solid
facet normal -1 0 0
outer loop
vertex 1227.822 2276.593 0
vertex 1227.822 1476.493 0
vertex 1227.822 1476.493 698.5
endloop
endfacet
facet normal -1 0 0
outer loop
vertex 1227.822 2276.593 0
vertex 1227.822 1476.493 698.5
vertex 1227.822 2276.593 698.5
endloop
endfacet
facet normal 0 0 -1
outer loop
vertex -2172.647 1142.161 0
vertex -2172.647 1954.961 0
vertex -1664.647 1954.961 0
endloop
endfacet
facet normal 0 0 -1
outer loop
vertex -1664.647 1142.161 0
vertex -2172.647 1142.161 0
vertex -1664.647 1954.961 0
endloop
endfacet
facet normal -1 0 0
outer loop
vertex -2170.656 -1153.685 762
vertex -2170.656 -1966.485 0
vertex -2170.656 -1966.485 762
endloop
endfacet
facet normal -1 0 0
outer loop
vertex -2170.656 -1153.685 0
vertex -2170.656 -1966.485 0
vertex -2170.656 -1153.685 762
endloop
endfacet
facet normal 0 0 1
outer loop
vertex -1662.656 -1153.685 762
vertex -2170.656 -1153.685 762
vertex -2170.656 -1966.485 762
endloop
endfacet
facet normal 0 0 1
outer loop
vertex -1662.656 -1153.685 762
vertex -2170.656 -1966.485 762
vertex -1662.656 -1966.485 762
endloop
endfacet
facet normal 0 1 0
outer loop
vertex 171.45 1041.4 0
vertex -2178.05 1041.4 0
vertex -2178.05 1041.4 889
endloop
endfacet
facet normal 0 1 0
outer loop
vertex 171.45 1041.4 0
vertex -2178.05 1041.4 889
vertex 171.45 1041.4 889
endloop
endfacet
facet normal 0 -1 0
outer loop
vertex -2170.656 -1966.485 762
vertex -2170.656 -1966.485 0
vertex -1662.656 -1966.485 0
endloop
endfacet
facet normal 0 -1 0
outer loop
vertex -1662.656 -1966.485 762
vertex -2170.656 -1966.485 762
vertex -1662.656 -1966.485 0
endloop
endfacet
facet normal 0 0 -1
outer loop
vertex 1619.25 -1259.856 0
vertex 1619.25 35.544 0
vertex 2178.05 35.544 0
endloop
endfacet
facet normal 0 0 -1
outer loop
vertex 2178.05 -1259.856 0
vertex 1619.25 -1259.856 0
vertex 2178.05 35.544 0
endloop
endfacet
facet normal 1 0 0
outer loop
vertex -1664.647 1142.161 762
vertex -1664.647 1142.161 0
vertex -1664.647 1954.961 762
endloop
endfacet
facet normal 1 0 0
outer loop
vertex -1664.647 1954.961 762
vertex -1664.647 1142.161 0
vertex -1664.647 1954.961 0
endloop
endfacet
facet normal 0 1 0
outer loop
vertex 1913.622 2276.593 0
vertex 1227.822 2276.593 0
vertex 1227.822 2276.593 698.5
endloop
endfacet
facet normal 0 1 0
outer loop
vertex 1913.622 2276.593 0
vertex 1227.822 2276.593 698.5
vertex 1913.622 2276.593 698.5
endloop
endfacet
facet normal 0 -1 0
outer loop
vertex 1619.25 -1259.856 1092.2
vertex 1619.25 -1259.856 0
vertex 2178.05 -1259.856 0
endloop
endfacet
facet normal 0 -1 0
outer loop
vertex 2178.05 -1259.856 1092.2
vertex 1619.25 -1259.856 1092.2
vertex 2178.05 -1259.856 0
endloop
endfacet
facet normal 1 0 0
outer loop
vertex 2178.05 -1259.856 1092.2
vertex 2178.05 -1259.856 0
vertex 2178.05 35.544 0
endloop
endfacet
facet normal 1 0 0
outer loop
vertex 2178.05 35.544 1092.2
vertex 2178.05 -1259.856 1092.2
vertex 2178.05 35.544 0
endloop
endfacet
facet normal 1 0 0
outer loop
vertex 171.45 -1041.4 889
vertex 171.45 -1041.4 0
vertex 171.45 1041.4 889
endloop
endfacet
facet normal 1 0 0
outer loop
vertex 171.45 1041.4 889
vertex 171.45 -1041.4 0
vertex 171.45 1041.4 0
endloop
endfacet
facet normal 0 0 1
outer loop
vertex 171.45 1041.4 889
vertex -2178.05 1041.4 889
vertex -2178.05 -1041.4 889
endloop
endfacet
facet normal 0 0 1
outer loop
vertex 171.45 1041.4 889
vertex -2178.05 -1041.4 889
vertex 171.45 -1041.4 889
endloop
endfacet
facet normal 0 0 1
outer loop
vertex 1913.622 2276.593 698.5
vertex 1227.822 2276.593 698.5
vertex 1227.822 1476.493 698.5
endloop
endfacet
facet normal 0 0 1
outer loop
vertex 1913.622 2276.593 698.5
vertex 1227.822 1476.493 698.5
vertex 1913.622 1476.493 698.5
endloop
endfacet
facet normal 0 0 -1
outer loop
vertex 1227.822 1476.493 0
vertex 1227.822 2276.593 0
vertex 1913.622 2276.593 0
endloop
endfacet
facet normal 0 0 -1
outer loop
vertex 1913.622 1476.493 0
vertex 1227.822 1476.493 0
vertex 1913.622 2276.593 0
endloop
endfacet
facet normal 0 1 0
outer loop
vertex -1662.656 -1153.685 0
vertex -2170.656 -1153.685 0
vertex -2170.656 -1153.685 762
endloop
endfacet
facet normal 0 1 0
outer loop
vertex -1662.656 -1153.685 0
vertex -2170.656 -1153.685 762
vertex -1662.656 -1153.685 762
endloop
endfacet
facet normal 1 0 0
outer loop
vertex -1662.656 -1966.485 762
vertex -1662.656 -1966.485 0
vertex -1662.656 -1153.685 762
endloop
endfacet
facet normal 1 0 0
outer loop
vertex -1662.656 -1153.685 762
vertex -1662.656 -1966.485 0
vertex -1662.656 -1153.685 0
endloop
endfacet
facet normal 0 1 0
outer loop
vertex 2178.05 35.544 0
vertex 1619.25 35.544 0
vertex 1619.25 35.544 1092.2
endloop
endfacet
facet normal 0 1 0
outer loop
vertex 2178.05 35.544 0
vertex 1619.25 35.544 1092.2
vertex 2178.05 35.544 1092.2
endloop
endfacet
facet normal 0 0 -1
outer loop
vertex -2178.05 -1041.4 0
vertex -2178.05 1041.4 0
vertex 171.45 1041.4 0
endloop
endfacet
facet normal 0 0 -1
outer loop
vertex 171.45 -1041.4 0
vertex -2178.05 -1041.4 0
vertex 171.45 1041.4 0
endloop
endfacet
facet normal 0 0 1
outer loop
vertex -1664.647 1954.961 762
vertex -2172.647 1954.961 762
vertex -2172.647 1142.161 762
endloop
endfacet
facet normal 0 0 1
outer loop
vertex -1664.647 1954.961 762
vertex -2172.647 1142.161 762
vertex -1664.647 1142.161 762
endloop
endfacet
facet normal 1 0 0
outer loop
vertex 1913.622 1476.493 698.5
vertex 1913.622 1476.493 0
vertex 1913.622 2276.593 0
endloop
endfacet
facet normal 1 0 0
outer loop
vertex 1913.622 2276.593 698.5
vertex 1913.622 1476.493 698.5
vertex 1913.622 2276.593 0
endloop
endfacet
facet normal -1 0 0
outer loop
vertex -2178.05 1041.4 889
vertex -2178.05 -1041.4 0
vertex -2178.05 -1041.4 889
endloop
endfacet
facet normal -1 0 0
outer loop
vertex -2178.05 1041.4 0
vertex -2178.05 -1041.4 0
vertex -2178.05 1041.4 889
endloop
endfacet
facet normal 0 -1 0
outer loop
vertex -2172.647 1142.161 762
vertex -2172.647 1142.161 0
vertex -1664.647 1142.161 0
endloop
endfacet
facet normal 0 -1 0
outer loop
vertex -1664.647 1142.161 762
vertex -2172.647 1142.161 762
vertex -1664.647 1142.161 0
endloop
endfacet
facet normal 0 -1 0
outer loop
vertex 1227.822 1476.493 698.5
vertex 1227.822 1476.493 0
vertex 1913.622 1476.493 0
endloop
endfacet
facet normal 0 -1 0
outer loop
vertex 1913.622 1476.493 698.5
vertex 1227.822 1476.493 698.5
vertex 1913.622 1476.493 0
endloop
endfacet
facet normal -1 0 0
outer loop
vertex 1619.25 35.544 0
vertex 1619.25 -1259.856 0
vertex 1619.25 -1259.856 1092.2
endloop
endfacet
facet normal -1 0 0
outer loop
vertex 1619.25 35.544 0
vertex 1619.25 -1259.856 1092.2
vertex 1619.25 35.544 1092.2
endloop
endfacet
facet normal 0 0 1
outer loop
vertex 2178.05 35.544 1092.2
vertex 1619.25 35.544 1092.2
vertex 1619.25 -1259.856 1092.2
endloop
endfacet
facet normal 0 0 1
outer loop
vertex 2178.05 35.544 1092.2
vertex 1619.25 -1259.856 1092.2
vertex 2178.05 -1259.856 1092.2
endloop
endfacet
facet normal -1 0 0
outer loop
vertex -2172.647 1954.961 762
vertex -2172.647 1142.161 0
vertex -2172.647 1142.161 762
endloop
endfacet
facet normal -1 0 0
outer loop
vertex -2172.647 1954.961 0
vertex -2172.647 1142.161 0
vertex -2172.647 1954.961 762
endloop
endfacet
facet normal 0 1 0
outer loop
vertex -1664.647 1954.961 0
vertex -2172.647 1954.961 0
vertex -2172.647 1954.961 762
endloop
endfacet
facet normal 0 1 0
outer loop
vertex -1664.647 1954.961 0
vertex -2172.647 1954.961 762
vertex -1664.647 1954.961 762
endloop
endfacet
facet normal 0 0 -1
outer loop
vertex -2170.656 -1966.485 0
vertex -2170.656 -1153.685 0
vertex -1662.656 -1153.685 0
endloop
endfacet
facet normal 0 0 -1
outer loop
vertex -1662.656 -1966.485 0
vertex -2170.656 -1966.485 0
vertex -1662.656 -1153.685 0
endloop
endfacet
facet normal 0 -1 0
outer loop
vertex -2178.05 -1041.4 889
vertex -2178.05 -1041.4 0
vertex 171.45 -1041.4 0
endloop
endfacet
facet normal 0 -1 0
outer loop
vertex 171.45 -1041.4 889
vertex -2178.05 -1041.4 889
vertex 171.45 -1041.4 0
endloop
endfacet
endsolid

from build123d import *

# Parameters (mm, degrees)
F0_W     = 508
F0_H     = 812.8
F2_DEPTH = 762
F0_W_2   = 2349.5
F0_H_2   = 2082.8
F3_DEPTH = 889
F0_W_3   = 558.8
F0_H_3   = 1295.4
F5_DEPTH = 1092.2
F0_W_4   = 685.8
F0_H_4   = 800.1
F6_DEPTH = 698.5


# Not quite as in the source:
# - the program builds the solid bodies; features that only make, move or delete a surface that nothing else refers to are left out


with BuildPart() as f2:
    # F0 (on Top) → F2 (new body)
    with BuildSketch(Plane.XY):
        with Locations((-1916.6557788849, -1560.0854158401)):
            Rectangle(F0_W, F0_H)
    extrude(amount=F2_DEPTH)


with BuildPart() as f2b:
    # F0 (on Top) → F2, piece 2 (new body)
    with BuildSketch(Plane.XY):
        with Locations((-1918.6471700668, 1548.560500145)):
            Rectangle(F0_W, F0_H)
    extrude(amount=F2_DEPTH)


with BuildPart() as f3:
    # F0 (on Top) → F3 (new body)
    with BuildSketch(Plane.XY):
        with Locations((-1003.3, 0)):
            Rectangle(F0_W_2, F0_H_2)
    extrude(amount=F3_DEPTH)


with BuildPart() as f5:
    # F0 (on Top) → F5 (new body)
    with BuildSketch(Plane.XY):
        with Locations((1898.65, -612.1559739113)):
            Rectangle(F0_W_3, F0_H_3)
    extrude(amount=F5_DEPTH)


with BuildPart() as f6:
    # F0 (on Top) → F6 (new body)
    with BuildSketch(Plane.XY):
        with Locations((1570.7222600937, 1876.5427314758)):
            Rectangle(F0_W_4, F0_H_4)
    extrude(amount=F6_DEPTH)


solid = Compound([f2.part, f2b.part, f3.part, f5.part, f6.part])
